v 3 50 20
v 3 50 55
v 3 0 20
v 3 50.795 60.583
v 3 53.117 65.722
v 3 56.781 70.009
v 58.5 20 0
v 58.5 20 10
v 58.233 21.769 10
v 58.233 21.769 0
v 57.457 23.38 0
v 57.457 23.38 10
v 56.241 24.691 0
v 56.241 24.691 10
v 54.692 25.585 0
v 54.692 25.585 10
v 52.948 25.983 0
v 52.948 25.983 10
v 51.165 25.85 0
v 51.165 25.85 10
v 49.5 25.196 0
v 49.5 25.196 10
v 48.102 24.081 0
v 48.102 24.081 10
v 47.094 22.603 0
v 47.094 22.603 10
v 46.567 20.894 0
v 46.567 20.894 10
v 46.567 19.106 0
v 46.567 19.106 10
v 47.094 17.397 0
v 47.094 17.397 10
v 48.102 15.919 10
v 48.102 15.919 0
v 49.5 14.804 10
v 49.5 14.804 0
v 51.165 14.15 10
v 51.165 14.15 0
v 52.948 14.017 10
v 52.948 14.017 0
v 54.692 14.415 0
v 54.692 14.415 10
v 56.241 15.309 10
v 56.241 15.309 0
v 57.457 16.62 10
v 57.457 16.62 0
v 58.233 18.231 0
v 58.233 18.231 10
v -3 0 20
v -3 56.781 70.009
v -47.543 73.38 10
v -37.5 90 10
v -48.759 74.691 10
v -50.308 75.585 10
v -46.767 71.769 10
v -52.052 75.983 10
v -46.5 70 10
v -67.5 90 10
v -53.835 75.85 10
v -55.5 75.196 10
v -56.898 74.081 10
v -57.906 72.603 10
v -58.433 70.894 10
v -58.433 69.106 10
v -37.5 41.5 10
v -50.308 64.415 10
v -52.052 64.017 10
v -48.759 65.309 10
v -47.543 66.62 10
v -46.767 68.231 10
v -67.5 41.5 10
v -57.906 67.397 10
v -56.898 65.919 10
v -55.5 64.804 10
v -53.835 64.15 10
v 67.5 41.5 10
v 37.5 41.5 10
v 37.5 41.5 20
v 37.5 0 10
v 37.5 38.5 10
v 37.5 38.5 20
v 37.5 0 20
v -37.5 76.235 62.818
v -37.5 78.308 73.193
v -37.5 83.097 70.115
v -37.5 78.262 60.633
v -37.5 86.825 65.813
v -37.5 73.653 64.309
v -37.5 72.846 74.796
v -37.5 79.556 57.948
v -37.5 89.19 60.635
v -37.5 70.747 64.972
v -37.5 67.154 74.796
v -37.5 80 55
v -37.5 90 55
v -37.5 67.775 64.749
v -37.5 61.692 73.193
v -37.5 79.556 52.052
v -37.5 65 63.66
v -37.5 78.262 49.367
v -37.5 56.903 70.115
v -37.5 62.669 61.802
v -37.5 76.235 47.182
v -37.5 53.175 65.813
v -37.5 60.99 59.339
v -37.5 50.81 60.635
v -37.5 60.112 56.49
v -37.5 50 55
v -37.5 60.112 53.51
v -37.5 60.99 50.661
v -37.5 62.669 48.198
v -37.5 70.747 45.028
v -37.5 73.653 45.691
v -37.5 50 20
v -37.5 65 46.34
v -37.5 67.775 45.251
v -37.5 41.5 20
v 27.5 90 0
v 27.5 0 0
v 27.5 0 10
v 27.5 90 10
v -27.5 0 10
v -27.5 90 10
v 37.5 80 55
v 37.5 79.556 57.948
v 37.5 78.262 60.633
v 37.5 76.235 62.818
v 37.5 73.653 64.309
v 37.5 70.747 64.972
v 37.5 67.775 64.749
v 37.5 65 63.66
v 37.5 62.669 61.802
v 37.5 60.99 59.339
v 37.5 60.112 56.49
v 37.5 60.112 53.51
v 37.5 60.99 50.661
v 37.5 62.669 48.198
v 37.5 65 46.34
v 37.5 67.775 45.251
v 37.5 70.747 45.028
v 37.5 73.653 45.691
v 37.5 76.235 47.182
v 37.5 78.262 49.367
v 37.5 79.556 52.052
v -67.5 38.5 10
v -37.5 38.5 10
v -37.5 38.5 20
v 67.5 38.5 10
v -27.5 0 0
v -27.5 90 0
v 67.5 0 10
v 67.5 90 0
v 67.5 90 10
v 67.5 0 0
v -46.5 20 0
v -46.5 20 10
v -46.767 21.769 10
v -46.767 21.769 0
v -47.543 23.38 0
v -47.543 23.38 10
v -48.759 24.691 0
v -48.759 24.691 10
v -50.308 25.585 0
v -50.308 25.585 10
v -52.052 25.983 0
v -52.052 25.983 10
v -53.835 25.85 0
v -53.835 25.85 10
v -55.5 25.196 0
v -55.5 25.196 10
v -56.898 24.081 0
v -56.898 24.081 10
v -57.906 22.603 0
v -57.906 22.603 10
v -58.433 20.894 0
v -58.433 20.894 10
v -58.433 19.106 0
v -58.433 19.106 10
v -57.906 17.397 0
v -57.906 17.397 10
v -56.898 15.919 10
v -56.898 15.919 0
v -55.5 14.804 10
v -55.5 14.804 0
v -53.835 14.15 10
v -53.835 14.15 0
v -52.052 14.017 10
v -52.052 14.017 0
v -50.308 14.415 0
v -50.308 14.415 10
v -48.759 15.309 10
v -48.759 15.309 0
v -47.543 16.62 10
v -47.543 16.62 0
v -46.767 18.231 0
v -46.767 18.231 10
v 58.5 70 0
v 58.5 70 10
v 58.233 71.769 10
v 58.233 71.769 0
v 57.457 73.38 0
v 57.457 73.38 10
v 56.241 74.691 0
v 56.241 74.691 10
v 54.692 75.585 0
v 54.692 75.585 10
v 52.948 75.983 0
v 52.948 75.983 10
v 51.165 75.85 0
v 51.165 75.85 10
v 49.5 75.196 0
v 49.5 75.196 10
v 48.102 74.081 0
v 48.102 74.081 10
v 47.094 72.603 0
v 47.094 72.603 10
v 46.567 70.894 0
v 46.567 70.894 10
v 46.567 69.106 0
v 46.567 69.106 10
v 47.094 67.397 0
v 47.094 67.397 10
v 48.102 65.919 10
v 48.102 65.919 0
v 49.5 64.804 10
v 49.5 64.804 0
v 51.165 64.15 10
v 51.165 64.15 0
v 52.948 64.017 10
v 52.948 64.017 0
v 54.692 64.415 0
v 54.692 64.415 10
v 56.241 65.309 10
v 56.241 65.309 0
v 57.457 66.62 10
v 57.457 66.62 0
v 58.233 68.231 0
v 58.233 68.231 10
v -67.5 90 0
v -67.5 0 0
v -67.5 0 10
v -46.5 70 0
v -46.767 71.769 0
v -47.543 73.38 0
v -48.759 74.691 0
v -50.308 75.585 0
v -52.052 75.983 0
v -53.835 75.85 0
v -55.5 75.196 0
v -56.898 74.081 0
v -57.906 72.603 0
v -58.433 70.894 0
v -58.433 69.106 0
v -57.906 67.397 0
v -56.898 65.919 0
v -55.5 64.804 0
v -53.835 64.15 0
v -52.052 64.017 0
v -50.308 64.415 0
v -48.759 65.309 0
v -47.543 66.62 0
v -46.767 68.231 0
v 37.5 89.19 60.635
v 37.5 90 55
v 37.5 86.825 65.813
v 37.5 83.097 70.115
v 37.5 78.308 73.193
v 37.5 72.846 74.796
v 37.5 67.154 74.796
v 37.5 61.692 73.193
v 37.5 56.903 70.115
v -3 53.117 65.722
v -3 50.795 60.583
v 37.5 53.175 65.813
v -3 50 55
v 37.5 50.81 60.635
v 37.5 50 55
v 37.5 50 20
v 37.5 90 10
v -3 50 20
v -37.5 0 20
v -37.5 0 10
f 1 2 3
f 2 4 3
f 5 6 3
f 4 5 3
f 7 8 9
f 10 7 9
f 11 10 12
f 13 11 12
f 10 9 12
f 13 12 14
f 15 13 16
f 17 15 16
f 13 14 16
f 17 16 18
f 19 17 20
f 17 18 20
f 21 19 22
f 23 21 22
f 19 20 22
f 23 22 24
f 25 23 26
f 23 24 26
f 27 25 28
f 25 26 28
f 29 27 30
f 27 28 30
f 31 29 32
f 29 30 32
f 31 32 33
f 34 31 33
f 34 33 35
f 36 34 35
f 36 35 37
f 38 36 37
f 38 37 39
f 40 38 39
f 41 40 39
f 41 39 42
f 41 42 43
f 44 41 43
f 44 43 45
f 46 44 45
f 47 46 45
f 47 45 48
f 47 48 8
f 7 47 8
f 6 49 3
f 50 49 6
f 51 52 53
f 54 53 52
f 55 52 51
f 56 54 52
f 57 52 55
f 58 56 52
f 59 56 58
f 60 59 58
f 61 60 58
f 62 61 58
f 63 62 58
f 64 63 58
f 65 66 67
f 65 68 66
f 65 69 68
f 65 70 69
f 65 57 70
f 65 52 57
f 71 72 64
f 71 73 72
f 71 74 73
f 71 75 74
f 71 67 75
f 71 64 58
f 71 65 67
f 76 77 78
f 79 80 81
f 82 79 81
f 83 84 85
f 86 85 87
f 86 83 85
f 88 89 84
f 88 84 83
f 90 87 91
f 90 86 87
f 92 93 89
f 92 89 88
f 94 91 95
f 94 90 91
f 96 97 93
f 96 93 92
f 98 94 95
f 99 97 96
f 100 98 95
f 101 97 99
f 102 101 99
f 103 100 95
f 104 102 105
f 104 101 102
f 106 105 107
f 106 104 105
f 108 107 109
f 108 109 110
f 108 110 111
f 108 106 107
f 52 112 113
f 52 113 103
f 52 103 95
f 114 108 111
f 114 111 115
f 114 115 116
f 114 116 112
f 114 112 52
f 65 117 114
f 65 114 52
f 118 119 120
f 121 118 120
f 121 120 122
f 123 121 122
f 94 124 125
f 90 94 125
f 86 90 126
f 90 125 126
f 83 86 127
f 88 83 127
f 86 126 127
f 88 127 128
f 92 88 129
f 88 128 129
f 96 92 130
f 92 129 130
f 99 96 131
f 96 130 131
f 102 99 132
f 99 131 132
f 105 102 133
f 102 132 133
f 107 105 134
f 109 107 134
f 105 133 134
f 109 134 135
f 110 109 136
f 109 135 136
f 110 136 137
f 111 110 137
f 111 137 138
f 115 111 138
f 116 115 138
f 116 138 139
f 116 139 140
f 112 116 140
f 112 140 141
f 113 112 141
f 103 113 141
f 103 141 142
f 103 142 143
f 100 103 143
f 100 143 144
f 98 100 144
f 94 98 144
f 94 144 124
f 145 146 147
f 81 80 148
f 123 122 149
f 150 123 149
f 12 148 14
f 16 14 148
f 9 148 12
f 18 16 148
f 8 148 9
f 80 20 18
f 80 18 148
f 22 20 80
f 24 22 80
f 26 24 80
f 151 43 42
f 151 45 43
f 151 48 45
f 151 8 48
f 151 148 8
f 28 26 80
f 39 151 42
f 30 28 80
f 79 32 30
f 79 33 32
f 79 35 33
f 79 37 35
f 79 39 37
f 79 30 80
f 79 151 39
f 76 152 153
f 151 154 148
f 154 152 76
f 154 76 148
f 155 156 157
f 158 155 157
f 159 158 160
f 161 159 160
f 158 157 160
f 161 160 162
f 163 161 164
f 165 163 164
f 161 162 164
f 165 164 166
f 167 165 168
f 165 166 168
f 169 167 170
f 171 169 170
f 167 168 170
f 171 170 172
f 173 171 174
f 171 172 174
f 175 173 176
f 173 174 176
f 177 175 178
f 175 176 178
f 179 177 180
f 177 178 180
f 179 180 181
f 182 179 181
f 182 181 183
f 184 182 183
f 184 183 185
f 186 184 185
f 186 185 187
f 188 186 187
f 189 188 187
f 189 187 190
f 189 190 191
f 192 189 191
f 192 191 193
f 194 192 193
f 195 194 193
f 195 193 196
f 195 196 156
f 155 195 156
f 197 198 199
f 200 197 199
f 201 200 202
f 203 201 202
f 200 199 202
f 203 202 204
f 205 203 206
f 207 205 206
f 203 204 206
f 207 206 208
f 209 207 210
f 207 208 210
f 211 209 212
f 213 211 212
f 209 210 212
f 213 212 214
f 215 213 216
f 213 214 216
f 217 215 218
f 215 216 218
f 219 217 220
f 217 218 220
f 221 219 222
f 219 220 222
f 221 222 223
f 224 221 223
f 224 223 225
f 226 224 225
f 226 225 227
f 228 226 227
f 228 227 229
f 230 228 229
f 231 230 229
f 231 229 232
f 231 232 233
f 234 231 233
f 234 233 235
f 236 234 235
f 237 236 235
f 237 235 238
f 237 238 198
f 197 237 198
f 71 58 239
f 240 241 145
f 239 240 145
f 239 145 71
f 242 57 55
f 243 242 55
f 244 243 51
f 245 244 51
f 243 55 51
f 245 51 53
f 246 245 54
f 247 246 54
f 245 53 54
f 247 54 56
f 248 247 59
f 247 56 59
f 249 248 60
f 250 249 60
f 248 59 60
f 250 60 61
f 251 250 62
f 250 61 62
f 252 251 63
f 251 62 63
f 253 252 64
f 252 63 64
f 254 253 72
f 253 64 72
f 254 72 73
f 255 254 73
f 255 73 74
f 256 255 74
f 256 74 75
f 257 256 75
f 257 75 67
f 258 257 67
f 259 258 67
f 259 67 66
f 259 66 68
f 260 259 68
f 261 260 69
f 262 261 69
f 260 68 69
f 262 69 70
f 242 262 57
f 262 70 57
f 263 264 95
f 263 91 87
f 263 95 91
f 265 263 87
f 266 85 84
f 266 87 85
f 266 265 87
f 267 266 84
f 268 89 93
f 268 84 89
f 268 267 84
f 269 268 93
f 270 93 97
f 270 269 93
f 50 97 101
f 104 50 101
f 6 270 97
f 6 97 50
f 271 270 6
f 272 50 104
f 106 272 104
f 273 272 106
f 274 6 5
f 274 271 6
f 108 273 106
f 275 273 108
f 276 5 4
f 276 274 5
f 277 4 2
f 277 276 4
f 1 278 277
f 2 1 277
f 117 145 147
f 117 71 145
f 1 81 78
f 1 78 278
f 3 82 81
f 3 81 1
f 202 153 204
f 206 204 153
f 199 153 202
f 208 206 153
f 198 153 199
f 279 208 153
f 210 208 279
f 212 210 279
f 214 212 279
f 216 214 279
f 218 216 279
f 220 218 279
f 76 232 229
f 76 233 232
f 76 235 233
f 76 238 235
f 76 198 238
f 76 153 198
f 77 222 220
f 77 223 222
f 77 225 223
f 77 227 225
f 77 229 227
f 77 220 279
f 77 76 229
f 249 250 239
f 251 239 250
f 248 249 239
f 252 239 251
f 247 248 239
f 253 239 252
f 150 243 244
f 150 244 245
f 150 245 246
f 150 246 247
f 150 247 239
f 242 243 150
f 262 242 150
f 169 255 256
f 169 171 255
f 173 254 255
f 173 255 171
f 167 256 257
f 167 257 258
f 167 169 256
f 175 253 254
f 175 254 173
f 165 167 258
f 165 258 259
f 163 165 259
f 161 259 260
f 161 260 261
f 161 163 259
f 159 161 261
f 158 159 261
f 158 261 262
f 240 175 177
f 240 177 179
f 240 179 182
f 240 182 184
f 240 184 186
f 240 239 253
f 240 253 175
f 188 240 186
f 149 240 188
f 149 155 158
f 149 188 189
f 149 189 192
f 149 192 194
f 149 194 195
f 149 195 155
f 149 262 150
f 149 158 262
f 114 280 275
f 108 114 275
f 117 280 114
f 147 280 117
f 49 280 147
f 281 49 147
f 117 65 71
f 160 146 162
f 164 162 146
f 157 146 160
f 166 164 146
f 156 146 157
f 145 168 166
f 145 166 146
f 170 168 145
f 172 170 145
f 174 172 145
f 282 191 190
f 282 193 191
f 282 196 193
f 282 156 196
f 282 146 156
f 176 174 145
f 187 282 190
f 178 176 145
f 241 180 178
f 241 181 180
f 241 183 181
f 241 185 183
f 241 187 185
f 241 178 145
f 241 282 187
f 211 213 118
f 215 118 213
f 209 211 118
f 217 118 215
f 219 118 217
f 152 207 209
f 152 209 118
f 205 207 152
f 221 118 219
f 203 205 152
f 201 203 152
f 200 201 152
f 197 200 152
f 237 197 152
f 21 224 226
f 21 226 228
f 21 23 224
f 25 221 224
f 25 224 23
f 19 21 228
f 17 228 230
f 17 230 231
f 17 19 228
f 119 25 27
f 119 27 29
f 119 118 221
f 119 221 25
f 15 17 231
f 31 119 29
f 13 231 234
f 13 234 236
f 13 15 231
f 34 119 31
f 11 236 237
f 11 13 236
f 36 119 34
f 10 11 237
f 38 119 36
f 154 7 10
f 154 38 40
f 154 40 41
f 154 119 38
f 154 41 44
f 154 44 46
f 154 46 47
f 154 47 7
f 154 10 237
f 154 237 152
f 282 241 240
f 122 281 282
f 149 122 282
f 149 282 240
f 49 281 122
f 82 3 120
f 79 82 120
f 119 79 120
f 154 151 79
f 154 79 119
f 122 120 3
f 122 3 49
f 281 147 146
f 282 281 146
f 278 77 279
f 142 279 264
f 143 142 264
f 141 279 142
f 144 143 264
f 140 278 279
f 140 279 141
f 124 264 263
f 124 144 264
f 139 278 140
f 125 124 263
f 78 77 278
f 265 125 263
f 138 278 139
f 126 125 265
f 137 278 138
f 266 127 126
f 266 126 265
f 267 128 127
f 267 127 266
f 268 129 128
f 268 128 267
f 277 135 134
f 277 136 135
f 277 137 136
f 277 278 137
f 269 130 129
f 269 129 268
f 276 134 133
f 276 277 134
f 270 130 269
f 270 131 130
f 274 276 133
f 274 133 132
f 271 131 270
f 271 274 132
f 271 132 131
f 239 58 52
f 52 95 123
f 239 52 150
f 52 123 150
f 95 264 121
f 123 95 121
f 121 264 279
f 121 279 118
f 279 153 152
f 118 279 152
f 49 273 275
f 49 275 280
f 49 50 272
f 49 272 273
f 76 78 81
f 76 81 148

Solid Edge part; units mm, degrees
sketch "Sketch1" plane through (0, 0, 0) normal (0, -1, 0) x (1, 0, 0)
  line L0 (37.5, 20) -> (-37.5, 20)
  line L1 (-37.5, 20) -> (-37.5, 10)
  line L2 (-37.5, 10) -> (-67.5, 10)
  line L3 (-67.5, 10) -> (-67.5, 0)
  line L4 (-67.5, 0) -> (-27.5, 0)
  line L5 (-27.5, 10) -> (-27.5, 0)
  line L6 (27.5, 10) -> (-27.5, 10)
  line L7 (27.5, 0) -> (27.5, 10)
  line L8 (27.5, 0) -> (37.5, 0)
  line L9 (37.5, 0) -> (67.5, 0)
  line L10 (67.5, 0) -> (67.5, 10)
  line L11 (67.5, 10) -> (37.5, 10)
  line L12 (37.5, 10) -> (37.5, 20)
extrude "Protrusion1" add sketch "Sketch1" against normal blind 90
sketch "Sketch2" plane through (-52.5, 45, 10) normal (0, 0, 1) x (1, 0, 0)
  circle A0 centre (0, 25) radius 6
  circle A1 centre (0, -25) radius 6
  circle A2 centre (105, -25) radius 6
  circle A3 centre (105, 25) radius 6
extrude "ExtrudedCutout_1" cut sketch "Sketch2" against normal blind 48.8931
sketch "Sketch3" plane through (0, 40, 10) normal (0, -1, 0) x (1, 0, 0)
  line L0 (-67.5, 0) -> (-37.5, 10)
  line L1 (-37.5, 10) -> (-37.5, 0)
  line L2 (-37.5, 0) -> (-67.5, 0)
  line L3 (37.5, 10) -> (67.5, 0)
  line L4 (67.5, 0) -> (37.5, 0)
  line L5 (37.5, 0) -> (37.5, 10)
extrude "ExtrudedProtrusion_2" add sketch "Sketch3" along normal mid plane 3
sketch "Sketch4" plane through (37.5, 65.75, 15) normal (1, 0, 0) x (0, 1, 0)
  line L0 (-15.75, 5) -> (-15.75, 40)
  line L1 (24.25, 40) -> (24.25, 5)
  line L2 (24.25, 5) -> (-15.75, 5)
  arc A0 (-15.75, 40) -> (24.25, 40) centre (4.25, 40) cw
  circle A1 centre (4.25, 40) radius 10
extrude "ExtrudedProtrusion_3" add sketch "Sketch4" against normal blind 75
sketch "Sketch5" plane through (0, 0, 0) normal (1, 0, 0) x (0, 1, 0)
  line L0 (0, 20) -> (56.7813, 70.0089)
  line L1 (50, 55) -> (50, 20)
  line L2 (50, 20) -> (0, 20)
  arc A0 (50, 55) -> (56.7813, 70.0089) centre (70, 55) cw
extrude "ExtrudedProtrusion_4" add sketch "Sketch5" along normal mid plane 6
